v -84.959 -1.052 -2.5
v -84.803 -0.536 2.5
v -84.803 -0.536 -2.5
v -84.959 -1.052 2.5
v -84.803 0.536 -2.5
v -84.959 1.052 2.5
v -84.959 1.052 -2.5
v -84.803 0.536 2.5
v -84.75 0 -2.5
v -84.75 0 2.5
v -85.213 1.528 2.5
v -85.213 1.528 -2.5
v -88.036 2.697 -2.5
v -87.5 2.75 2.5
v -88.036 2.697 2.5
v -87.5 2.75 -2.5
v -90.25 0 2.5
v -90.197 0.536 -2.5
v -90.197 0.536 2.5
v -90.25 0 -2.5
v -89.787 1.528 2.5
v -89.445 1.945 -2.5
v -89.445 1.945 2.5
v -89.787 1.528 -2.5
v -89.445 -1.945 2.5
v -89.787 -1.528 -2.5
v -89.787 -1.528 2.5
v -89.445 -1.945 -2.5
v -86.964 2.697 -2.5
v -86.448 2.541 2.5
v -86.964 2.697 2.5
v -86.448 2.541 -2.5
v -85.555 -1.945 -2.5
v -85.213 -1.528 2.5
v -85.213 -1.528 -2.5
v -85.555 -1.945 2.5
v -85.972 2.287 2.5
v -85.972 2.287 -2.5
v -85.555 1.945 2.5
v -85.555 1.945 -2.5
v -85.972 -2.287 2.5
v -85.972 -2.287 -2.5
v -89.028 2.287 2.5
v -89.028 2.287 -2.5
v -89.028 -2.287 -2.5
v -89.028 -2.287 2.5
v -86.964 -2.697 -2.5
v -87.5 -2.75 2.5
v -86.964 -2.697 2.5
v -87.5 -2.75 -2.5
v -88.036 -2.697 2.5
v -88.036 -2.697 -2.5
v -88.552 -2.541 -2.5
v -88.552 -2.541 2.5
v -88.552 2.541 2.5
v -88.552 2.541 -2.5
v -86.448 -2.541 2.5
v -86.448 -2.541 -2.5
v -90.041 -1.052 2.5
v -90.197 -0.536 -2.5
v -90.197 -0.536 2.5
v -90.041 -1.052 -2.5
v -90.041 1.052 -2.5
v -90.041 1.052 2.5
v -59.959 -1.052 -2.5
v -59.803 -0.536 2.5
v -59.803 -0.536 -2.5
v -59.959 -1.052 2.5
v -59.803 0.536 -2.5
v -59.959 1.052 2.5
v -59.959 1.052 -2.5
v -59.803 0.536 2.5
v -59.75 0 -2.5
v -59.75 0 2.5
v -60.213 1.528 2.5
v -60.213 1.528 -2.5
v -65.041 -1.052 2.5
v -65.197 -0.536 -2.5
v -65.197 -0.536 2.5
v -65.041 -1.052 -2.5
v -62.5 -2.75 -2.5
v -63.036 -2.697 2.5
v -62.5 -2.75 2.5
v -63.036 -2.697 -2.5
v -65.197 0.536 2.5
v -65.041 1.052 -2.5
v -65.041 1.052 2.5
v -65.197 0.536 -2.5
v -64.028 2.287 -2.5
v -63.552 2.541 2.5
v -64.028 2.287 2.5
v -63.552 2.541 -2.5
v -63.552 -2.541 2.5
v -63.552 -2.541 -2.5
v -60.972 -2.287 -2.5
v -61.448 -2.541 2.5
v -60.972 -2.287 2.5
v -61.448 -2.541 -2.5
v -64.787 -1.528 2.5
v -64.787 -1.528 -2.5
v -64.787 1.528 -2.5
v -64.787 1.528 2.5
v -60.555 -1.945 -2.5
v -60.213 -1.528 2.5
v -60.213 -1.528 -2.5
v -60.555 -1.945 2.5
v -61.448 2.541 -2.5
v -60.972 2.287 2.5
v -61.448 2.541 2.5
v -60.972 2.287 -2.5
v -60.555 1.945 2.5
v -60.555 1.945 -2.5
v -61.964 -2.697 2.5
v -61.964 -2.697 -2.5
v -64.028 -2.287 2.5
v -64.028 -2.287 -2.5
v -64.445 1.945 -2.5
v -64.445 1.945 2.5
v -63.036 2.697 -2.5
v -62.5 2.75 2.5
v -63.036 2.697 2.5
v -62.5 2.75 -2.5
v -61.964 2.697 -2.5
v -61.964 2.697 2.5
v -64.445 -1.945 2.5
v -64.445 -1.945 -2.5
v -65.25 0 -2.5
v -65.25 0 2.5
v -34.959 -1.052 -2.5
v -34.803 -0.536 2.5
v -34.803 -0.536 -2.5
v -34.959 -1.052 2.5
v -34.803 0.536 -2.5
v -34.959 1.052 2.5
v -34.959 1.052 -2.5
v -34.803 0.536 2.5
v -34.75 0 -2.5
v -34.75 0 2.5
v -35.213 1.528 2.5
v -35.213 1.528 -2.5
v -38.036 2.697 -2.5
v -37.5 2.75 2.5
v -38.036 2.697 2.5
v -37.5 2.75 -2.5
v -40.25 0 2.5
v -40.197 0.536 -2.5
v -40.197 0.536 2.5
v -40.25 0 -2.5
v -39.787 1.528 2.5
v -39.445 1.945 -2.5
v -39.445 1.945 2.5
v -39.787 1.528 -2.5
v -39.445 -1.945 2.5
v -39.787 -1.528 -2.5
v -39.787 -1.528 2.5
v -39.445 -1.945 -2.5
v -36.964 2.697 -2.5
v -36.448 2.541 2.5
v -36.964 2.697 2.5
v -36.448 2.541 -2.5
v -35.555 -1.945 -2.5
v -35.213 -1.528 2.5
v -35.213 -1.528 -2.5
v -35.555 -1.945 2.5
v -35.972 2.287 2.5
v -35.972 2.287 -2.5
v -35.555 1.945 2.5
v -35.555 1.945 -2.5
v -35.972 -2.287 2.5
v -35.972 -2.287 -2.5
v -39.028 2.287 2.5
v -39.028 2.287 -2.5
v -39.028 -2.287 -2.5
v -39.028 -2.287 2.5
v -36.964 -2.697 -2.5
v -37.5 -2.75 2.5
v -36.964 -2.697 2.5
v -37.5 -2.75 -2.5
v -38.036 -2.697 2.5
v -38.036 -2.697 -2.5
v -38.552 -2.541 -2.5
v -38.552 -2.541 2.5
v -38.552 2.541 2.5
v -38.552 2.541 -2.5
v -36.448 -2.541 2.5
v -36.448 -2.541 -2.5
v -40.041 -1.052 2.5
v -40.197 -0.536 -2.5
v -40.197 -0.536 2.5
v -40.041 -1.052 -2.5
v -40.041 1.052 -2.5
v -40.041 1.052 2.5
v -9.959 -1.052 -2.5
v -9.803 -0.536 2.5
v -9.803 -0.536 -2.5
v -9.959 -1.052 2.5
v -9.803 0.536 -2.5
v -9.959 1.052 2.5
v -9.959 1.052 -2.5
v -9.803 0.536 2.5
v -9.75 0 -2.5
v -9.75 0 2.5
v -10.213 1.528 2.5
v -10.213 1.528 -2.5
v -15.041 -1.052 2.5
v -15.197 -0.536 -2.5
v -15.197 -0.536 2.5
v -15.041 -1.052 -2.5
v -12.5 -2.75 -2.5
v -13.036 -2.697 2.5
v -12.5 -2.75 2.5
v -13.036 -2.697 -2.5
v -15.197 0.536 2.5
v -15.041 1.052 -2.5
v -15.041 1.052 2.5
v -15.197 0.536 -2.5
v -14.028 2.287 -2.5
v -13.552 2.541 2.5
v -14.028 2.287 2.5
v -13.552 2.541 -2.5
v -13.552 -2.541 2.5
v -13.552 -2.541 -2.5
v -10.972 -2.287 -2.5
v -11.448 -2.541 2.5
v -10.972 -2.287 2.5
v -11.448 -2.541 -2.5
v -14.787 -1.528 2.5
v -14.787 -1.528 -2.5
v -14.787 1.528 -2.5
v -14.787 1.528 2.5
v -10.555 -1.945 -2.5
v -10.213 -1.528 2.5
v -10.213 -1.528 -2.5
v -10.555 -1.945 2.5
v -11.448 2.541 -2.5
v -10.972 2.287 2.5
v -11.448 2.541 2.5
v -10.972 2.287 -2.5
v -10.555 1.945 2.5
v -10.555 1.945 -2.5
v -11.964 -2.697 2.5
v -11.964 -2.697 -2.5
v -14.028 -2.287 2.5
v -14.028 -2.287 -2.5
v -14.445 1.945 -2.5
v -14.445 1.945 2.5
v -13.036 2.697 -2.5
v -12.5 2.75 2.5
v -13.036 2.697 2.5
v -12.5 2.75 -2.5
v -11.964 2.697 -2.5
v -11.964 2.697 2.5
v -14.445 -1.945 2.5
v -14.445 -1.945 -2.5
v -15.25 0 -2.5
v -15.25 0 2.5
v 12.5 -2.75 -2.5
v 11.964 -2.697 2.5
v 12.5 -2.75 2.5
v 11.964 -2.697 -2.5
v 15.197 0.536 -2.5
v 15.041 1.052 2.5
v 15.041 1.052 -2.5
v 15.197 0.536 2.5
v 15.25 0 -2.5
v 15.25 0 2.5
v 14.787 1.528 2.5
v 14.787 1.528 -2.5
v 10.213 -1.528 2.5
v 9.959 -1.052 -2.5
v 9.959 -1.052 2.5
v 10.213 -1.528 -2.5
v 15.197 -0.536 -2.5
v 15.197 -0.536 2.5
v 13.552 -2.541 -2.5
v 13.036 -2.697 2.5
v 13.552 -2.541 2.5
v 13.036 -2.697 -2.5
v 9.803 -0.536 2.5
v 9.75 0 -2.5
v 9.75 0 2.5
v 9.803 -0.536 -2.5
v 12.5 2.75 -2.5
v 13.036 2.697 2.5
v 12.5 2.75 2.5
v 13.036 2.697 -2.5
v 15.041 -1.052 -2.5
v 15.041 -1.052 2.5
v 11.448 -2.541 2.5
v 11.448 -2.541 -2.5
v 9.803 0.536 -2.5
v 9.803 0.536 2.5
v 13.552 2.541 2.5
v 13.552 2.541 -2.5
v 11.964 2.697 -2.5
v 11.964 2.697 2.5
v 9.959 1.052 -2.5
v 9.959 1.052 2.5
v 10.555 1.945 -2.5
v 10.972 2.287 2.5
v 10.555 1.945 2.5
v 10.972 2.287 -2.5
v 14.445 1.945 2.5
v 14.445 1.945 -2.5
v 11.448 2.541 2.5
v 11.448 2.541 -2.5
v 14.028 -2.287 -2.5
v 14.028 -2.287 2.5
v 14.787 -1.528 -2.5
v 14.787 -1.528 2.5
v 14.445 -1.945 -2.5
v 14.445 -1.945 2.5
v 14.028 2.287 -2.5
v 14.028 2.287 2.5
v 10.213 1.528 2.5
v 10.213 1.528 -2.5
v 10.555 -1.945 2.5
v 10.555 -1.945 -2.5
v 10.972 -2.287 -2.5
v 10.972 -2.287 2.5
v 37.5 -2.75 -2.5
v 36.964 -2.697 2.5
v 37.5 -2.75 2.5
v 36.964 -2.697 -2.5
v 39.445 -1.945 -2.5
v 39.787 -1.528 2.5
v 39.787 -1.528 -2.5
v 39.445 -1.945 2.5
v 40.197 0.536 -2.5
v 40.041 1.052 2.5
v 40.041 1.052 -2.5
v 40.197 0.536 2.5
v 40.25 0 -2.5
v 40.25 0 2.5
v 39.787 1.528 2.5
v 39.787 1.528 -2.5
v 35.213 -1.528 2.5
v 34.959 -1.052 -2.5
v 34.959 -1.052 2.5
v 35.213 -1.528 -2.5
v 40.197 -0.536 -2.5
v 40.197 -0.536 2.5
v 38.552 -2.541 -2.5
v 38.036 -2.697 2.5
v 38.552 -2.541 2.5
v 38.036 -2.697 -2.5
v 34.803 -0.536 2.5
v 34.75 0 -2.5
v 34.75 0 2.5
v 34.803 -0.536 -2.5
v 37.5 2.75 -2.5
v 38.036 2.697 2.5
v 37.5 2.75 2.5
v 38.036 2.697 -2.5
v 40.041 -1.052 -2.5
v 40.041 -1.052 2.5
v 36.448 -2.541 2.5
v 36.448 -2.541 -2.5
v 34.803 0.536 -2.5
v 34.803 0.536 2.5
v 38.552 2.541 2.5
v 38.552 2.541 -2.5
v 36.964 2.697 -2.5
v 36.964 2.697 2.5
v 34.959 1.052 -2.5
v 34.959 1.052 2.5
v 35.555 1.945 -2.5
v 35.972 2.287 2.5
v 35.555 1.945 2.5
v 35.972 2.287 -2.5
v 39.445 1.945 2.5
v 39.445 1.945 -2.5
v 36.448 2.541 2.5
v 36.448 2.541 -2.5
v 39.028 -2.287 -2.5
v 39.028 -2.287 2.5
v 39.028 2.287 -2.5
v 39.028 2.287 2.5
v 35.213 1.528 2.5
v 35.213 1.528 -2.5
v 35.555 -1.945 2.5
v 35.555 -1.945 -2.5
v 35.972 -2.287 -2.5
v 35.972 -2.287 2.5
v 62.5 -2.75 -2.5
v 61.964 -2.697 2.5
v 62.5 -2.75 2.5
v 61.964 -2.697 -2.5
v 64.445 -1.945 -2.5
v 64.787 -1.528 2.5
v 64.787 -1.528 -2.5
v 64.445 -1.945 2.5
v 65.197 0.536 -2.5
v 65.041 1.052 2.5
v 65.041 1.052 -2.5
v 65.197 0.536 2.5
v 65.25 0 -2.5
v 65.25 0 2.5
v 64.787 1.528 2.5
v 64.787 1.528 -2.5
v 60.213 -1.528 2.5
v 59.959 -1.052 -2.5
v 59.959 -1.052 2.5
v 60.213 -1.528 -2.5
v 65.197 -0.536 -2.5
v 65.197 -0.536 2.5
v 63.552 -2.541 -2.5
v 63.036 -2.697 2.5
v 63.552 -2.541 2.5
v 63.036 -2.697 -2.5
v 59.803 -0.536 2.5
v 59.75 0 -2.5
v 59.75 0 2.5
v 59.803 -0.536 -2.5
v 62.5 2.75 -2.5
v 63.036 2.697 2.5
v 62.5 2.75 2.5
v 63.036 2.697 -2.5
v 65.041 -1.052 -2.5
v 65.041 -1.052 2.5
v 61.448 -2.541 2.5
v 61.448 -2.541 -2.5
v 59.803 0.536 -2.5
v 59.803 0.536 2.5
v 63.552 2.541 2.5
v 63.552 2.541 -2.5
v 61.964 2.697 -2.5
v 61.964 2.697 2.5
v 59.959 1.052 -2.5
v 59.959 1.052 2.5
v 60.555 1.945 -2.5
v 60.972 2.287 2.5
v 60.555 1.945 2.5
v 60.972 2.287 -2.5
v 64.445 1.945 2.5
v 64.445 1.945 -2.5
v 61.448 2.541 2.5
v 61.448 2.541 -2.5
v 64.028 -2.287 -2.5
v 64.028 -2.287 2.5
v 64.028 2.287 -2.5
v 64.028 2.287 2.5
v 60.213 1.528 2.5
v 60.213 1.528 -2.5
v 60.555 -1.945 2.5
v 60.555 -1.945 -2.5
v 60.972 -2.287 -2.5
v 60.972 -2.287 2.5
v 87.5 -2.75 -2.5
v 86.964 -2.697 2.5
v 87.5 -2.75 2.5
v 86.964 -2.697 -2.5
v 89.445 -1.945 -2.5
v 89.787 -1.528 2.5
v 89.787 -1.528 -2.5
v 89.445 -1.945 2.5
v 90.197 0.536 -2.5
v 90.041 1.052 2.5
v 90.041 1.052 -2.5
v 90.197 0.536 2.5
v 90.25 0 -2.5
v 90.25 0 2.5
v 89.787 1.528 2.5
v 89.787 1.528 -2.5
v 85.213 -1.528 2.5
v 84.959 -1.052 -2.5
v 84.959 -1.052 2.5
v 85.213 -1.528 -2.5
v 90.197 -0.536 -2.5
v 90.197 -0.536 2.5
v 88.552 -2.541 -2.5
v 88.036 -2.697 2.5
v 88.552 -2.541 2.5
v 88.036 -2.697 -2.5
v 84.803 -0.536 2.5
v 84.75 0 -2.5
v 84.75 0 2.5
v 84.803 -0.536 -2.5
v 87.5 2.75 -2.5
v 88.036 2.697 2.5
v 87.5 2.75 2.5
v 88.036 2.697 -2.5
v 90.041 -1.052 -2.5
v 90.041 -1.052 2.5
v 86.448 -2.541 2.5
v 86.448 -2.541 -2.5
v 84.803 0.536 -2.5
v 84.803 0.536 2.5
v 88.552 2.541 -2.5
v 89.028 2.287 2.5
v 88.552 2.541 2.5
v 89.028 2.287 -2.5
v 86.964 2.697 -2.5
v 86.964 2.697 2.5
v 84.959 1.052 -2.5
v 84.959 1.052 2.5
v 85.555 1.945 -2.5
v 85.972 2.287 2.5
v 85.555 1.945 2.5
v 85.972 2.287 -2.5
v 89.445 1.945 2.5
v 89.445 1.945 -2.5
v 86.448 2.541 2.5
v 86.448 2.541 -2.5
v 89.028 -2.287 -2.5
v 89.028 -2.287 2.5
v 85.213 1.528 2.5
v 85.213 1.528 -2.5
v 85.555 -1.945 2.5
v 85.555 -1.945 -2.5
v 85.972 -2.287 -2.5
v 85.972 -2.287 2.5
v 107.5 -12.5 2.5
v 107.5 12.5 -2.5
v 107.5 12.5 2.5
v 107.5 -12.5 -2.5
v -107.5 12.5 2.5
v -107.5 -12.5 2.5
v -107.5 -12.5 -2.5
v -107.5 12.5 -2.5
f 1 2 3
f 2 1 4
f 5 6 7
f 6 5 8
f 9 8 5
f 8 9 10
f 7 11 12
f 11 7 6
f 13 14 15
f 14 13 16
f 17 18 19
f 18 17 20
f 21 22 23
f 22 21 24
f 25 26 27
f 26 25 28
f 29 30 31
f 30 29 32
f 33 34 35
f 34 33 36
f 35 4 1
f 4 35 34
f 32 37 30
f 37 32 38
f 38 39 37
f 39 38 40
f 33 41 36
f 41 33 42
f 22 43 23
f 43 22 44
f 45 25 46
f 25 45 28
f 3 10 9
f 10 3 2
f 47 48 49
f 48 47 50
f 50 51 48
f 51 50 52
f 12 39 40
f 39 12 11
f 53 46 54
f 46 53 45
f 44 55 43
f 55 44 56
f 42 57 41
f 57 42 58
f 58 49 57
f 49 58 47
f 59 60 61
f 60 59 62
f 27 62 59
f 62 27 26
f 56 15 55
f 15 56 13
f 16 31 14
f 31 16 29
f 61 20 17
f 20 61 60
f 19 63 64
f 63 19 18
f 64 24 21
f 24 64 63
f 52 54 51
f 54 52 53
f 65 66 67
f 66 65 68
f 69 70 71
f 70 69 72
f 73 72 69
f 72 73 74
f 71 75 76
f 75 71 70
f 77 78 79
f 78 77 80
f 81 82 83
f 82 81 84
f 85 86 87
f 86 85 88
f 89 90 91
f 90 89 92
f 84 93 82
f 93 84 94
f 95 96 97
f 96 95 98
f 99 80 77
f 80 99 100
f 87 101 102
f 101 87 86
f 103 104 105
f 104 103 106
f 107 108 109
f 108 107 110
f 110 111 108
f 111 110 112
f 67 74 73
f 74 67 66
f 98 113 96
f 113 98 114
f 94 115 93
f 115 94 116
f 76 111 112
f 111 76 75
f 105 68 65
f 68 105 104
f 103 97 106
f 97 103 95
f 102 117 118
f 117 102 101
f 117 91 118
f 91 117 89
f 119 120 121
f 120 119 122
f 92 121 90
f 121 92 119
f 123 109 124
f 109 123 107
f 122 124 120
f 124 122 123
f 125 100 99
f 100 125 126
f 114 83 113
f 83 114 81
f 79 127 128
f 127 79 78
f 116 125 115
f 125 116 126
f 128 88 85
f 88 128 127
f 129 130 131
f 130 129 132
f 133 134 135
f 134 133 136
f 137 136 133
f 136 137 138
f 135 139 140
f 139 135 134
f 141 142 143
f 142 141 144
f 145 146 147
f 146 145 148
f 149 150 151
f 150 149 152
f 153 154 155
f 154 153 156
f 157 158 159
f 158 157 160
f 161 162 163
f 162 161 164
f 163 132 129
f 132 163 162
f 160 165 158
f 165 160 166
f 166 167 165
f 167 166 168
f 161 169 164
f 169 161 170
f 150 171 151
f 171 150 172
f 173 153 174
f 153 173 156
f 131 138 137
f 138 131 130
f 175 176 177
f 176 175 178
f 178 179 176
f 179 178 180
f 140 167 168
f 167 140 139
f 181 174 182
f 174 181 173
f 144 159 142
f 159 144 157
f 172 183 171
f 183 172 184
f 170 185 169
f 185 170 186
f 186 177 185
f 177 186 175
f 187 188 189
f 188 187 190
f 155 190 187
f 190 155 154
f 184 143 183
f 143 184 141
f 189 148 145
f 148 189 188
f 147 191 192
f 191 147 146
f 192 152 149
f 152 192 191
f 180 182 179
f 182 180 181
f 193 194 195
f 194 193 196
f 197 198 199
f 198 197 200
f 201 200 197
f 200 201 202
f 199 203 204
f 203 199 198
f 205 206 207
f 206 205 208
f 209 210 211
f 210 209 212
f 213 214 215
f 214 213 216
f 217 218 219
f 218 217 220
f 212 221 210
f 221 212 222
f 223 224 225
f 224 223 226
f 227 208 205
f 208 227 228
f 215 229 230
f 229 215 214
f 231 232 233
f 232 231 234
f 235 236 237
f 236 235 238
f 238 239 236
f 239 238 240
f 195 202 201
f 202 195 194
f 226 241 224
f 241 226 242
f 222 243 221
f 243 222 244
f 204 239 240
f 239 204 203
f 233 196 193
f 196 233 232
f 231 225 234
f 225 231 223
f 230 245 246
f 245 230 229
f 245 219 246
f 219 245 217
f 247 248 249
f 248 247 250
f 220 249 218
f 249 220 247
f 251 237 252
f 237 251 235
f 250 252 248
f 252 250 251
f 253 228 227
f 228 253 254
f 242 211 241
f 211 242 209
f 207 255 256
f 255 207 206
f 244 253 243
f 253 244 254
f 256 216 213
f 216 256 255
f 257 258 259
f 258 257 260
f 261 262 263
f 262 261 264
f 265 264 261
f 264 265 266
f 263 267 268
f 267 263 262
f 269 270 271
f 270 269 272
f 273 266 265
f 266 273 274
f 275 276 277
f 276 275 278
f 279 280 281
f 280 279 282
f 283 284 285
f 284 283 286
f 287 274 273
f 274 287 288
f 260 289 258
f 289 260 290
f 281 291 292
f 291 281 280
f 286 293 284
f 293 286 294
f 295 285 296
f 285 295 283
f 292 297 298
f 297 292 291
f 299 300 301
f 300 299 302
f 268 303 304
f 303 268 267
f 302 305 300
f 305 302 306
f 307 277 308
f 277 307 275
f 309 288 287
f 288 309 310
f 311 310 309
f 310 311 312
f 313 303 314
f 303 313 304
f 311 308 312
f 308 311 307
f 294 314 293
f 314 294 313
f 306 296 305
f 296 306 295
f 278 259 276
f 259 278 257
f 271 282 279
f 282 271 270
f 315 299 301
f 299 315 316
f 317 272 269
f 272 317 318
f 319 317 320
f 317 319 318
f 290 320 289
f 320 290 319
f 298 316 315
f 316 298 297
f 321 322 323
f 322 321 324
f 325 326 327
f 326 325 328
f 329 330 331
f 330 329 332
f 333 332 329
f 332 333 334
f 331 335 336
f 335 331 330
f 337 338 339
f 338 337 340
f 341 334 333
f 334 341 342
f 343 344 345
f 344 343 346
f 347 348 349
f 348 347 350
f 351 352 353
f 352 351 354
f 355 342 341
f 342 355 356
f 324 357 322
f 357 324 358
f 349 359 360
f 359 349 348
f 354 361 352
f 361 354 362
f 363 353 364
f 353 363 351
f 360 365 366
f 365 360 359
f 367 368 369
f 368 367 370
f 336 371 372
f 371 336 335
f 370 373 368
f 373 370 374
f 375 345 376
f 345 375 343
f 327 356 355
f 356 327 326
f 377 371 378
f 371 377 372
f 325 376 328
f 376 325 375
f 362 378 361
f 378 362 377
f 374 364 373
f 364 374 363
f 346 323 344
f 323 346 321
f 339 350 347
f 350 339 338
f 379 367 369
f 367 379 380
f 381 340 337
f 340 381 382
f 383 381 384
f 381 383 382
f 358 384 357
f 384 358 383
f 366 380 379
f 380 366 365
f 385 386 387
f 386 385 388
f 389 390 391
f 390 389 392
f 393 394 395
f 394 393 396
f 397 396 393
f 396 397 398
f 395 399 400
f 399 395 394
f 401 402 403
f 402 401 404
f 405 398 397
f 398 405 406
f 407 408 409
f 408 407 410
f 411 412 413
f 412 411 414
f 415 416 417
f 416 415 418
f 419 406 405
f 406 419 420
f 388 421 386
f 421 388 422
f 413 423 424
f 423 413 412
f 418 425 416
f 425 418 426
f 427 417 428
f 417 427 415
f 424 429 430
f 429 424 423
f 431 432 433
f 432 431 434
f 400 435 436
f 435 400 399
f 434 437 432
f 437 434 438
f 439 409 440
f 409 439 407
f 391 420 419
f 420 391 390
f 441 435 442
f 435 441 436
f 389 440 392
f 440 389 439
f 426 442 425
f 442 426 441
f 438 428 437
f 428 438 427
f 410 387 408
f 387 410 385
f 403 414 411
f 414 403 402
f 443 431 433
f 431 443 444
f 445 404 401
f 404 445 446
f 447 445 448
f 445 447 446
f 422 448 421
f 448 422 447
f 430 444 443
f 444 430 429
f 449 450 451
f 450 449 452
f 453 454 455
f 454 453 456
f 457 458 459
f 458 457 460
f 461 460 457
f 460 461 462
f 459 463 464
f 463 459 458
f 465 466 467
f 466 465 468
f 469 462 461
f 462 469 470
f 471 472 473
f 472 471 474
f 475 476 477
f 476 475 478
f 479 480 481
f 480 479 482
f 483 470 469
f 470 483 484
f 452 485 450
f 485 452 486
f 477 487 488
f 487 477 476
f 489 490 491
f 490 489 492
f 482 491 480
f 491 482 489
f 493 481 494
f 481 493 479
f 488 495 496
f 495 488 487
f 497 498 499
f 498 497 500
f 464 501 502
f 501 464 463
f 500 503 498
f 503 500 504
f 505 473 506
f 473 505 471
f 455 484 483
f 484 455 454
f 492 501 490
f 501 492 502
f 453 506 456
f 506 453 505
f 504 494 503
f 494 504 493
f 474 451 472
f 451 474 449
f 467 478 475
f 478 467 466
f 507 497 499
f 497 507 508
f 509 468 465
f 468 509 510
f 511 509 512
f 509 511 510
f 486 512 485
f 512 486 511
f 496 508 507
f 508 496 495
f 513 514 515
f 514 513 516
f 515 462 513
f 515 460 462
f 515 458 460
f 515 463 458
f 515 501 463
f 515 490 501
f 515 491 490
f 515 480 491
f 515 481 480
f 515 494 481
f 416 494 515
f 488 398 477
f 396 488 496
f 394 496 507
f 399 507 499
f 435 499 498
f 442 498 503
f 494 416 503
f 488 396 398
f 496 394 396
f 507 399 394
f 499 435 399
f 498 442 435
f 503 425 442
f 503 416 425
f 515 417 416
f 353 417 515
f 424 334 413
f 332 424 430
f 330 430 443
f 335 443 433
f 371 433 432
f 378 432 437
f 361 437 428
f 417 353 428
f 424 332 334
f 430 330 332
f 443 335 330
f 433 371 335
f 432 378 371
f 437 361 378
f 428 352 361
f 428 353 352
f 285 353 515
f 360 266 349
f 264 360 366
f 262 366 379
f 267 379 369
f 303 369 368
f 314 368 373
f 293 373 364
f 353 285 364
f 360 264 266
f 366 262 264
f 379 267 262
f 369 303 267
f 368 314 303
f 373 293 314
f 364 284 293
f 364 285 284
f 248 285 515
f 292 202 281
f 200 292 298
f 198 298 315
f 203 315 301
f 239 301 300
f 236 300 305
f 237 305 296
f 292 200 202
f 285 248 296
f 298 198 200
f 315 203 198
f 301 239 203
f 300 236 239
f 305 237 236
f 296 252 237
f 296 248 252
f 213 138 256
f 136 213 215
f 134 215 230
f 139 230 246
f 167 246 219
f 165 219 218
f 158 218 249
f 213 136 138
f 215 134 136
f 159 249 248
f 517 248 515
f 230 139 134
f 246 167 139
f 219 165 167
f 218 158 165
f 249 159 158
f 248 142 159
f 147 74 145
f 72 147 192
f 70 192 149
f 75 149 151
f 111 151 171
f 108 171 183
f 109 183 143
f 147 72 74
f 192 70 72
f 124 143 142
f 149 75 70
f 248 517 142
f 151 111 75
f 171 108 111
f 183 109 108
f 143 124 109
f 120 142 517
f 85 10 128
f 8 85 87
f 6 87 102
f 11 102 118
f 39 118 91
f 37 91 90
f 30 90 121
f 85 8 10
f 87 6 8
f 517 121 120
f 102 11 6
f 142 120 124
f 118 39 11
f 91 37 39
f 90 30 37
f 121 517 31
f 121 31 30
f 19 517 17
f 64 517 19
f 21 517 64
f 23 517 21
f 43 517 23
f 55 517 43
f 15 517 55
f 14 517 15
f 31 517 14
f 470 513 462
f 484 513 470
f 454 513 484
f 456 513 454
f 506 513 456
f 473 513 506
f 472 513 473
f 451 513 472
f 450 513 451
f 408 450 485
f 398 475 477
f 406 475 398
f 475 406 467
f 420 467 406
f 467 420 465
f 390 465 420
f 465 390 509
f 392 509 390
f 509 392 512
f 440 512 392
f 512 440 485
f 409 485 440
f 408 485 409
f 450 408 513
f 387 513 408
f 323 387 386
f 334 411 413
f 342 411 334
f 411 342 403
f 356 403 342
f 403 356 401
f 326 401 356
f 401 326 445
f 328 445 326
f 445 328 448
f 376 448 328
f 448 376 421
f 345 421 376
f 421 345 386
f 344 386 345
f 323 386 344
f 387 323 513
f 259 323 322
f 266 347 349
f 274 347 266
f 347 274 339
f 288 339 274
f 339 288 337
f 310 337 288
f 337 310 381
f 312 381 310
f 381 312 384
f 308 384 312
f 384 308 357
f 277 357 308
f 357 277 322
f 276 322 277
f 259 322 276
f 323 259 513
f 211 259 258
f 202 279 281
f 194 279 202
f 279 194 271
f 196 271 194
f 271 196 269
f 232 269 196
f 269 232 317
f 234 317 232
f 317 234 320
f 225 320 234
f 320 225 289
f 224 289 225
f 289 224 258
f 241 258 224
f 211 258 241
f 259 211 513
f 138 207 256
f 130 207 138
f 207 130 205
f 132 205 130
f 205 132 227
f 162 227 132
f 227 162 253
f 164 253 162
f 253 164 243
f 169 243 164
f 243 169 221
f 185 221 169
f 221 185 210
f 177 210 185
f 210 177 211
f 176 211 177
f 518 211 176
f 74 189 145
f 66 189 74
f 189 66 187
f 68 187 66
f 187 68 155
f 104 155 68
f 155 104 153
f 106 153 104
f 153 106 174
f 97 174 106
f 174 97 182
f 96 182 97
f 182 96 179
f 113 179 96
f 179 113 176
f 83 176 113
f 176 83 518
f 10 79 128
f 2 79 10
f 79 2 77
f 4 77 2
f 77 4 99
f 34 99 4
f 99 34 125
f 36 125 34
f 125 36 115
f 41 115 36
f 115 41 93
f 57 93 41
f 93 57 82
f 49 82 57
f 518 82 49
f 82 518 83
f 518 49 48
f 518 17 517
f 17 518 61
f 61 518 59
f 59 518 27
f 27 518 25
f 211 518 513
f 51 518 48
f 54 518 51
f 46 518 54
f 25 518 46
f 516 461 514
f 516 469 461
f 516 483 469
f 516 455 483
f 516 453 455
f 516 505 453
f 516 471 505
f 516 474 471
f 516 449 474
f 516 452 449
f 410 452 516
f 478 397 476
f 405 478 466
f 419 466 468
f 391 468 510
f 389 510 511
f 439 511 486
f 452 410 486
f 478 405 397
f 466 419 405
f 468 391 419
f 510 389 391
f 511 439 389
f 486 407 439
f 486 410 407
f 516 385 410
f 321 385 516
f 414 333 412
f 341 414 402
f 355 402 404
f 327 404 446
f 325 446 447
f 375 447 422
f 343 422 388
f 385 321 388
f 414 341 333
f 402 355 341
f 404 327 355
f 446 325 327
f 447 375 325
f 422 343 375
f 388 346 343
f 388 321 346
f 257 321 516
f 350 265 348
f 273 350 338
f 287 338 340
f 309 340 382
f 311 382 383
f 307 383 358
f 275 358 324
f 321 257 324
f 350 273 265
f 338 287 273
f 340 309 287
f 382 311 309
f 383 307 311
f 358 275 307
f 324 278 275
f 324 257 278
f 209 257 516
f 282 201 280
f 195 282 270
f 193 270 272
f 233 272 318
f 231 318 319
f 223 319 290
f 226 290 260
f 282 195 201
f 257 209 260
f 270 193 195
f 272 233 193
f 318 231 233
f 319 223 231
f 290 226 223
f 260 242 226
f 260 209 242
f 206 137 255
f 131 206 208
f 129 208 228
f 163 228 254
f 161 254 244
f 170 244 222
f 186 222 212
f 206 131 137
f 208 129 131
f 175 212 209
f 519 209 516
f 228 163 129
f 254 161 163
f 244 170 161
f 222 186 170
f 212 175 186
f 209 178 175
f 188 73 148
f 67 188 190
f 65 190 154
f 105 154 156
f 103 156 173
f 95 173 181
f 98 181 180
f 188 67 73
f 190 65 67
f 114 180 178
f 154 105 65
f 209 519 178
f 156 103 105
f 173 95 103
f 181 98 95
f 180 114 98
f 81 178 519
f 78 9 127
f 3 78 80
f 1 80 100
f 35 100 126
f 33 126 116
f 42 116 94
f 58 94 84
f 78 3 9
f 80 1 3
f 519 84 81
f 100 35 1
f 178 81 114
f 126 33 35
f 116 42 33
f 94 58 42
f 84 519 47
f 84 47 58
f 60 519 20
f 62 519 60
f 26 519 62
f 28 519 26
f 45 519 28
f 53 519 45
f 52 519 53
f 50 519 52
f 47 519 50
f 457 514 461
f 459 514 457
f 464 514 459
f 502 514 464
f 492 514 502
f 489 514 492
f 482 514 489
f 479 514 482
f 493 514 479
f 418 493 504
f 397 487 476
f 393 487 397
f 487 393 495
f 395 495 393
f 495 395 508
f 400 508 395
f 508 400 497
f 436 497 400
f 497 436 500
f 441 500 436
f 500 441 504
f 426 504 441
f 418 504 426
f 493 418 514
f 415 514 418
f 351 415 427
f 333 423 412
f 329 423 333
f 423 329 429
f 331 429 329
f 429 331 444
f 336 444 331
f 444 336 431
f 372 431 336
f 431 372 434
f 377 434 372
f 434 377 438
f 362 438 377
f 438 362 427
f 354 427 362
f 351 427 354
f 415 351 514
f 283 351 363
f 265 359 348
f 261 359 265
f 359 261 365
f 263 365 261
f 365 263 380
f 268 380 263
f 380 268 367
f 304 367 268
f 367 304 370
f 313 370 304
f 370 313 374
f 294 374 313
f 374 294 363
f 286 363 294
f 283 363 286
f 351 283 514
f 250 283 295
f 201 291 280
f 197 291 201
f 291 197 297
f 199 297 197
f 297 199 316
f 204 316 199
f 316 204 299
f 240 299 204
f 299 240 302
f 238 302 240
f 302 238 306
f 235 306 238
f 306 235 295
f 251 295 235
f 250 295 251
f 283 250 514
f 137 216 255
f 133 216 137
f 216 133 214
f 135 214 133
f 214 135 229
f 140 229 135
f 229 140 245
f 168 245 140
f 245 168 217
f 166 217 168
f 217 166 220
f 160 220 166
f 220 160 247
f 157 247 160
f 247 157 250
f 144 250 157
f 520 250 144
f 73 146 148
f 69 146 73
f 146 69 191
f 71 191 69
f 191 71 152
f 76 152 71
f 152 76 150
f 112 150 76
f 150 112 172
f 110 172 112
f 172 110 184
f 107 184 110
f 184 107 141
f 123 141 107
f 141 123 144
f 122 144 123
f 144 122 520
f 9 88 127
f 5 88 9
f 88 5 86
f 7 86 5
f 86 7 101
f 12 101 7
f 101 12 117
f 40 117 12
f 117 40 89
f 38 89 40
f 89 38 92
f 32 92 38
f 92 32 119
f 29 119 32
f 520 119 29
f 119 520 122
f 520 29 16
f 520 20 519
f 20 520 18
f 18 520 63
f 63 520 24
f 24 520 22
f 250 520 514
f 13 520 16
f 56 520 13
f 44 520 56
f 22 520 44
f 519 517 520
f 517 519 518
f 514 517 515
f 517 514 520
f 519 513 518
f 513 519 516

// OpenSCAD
$fn = 32;

// ----------------------------------------------------------------------
// Hole bar, 8 x Ø5.5
// row layout, 20 mm edge offset
// ----------------------------------------------------------------------

// --- parameters (mm) ---
bar_w = 25;    // bar width (Y)
bar_t = 5;     // bar thickness (Z)
holes = 8;     // holes per row
hole_d = 5.5;  // hole diameter
edge = 20;     // offset from the bar end to the first hole
pitch = 25;    // pitch between neighbouring holes

// --- derived feature positions (mm) ---
span = (holes - 1) * pitch;   // = 175   distance between the end holes
bar_l = span + 2 * edge;      // = 215   overall bar length
start_x = -bar_l / 2 + edge;  // = -87.5   X of the first hole
feature_centers = [
  [start_x + 0 * pitch, 0],
  [start_x + 1 * pitch, 0],
  [start_x + 2 * pitch, 0],
  [start_x + 3 * pitch, 0],
  [start_x + 4 * pitch, 0],
  [start_x + 5 * pitch, 0],
  [start_x + 6 * pitch, 0],
  [start_x + 7 * pitch, 0]
];   // hole centres of the first row

// bar with one row of holes, drilled from feature_centers
difference() {
  translate([-bar_l / 2, -bar_w / 2, -bar_t / 2]) cube([bar_l, bar_w, bar_t]);
  for (centre = feature_centers)
    translate([centre[0], centre[1], 0])
      cylinder(d = hole_d, h = bar_t + 2, center = true);
}
